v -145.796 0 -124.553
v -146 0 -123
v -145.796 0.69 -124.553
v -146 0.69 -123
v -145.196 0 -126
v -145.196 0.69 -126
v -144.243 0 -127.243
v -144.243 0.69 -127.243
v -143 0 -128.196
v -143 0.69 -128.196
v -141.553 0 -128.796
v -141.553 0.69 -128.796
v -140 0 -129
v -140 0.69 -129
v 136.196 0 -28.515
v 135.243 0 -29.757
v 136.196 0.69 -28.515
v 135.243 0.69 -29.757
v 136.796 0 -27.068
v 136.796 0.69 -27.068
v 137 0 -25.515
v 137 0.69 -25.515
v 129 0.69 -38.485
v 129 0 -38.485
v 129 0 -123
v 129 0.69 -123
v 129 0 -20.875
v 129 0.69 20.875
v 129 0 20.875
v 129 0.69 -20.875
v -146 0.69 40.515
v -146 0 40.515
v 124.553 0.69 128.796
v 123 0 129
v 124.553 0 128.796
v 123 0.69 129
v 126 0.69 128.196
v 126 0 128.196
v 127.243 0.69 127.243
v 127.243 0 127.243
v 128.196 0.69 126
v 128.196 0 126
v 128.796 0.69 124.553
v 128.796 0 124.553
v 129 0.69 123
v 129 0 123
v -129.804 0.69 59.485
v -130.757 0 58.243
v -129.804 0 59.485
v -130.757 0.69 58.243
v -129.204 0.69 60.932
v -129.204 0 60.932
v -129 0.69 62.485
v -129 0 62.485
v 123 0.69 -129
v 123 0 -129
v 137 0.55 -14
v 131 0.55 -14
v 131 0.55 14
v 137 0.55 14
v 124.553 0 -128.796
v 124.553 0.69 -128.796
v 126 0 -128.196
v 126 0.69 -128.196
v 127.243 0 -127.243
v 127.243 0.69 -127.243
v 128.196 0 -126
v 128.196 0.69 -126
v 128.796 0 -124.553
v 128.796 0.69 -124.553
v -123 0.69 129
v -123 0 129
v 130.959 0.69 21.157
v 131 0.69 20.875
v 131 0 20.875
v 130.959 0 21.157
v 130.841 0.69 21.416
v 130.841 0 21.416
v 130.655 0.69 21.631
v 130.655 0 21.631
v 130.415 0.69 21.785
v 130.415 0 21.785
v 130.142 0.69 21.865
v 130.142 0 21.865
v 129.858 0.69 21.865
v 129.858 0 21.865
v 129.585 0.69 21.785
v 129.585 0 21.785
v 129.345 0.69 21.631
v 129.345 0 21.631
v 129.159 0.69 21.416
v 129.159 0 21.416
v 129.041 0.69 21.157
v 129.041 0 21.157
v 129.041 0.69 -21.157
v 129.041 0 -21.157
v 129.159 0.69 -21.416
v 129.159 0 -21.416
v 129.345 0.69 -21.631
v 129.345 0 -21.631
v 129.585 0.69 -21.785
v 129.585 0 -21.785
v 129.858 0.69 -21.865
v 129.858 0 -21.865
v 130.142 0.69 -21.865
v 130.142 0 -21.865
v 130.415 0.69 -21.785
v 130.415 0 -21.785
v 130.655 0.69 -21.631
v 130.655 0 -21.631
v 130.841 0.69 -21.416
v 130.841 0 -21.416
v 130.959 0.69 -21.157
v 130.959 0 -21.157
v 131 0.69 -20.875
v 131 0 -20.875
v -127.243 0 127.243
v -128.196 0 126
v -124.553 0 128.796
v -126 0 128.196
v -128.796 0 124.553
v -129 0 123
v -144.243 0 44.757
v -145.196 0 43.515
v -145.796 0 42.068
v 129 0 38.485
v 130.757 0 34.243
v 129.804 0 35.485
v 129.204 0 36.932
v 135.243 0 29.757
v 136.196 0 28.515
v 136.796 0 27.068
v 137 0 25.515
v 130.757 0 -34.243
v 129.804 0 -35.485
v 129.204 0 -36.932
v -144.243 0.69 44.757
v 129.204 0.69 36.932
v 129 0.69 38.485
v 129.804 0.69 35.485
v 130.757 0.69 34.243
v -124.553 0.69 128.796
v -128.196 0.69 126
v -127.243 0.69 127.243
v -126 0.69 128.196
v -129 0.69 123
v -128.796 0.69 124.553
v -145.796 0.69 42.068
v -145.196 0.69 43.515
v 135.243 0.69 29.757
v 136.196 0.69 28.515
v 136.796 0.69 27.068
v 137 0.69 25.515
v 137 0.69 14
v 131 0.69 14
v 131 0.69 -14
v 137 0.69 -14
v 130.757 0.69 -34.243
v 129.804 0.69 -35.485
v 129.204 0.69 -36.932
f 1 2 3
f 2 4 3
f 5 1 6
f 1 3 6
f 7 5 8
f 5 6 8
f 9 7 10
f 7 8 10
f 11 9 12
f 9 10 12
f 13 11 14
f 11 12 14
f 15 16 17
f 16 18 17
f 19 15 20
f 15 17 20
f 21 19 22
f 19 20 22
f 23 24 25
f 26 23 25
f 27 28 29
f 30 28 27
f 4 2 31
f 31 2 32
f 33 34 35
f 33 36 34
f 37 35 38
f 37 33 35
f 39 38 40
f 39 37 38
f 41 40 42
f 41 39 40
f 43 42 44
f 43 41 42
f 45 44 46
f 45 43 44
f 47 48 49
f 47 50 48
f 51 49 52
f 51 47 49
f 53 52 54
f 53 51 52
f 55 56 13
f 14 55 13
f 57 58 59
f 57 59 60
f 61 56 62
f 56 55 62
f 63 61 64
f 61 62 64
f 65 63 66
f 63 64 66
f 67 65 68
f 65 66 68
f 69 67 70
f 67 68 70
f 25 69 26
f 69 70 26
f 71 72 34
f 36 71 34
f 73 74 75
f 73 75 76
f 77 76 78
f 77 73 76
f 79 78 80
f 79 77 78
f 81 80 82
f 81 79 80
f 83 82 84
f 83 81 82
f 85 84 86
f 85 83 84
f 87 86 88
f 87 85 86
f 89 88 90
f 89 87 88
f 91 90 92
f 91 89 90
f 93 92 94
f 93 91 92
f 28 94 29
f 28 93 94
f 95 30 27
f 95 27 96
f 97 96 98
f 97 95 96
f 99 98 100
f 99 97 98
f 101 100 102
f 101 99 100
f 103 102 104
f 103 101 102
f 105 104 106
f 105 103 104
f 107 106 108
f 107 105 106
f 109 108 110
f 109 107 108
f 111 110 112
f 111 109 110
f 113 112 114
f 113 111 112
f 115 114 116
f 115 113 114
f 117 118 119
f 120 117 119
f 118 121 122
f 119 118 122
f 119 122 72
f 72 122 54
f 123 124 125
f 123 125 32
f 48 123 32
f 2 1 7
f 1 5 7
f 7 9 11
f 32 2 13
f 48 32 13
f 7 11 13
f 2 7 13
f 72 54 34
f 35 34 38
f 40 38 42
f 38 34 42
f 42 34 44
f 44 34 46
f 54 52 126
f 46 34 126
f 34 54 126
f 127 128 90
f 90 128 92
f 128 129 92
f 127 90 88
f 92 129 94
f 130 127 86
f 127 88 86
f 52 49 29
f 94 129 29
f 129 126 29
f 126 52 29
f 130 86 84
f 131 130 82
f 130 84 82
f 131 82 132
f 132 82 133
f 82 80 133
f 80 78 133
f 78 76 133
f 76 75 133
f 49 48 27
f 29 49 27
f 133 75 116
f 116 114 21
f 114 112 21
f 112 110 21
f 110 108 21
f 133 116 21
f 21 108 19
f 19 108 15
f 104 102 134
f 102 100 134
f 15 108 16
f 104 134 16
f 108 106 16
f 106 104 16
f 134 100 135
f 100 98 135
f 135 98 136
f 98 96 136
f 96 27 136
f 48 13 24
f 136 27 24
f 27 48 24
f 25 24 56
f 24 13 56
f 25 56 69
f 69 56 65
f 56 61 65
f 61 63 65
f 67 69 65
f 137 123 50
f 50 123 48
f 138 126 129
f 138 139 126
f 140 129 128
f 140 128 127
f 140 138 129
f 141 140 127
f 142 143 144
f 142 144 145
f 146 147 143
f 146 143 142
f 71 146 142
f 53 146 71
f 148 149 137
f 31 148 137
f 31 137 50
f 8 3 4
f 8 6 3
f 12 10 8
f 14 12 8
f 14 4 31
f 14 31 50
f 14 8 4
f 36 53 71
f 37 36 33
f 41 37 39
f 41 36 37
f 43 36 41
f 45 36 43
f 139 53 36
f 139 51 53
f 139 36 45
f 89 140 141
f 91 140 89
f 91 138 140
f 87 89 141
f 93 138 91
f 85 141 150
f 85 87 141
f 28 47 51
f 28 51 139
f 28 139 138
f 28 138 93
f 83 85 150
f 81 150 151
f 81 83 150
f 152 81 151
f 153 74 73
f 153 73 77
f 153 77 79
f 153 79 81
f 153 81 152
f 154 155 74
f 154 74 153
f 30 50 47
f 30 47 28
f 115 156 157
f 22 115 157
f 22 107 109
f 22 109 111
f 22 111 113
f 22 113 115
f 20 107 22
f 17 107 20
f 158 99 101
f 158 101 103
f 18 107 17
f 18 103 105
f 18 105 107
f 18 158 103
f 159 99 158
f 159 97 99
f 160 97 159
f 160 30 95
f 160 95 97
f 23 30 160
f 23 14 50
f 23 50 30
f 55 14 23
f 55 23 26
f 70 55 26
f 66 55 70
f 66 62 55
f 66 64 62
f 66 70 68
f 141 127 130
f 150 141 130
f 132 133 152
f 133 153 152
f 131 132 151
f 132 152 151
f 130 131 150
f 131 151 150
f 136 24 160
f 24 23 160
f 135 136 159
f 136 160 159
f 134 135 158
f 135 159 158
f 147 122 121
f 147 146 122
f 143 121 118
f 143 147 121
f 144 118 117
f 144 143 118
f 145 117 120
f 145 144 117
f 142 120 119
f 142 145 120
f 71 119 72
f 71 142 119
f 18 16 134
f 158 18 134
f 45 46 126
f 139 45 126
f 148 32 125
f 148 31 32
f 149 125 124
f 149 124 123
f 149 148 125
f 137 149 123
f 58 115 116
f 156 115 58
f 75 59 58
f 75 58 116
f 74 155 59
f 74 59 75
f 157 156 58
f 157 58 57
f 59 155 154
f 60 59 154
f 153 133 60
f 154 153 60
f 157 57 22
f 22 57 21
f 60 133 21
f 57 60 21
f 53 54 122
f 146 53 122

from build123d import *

# Parameters (mm, degrees)
BOSS_EXTRUDE1_DEPTH = 0.69
CUT_EXTRUDE1_DEPTH  = 1.69
SKETCH3_W           = 6
SKETCH3_H           = 28
CUT_EXTRUDE2_DEPTH  = 0.14
FILLET1_R           = 6


with BuildPart() as part:
    # Sketch1 → Boss-Extrude1 (new body)
    with BuildSketch(Plane(origin=(0, 0, 0), x_dir=(1, 0, 0), z_dir=(0, 1, 0))):
        Polygon((-146, 129), (-146, -43), (-129, -60), (-129, -129), (129, -129), (129, -36), (137, -28), (137, 28), (129, 36), (129, 129), align=None)
    extrude(amount=BOSS_EXTRUDE1_DEPTH)

    # Sketch2 → Cut-Extrude1 (cut, through all)
    with BuildSketch(Plane(origin=(0, 0.69, 0), x_dir=(1, 0, 0), z_dir=(0, 1, 0))):
        with BuildLine():
            Line((131, 20.875), (131, -20.875))
            ThreePointArc((131, -20.875), (130, -21.875), (129, -20.875))
            Line((129, -20.875), (129, 20.875))
            ThreePointArc((129, 20.875), (130, 21.875), (131, 20.875))
        make_face()
    extrude(amount=-CUT_EXTRUDE1_DEPTH, mode=Mode.SUBTRACT)

    # Sketch3 → Cut-Extrude2 (cut)
    with BuildSketch(Plane(origin=(0, 0.69, 0), x_dir=(1, 0, 0), z_dir=(0, 1, 0))):
        with Locations((134, 0)):
            Rectangle(SKETCH3_W, SKETCH3_H)
    extrude(amount=-CUT_EXTRUDE2_DEPTH, mode=Mode.SUBTRACT)

    # Fillet1
    fillet1_edges = [part.edges().sort_by_distance(p)[0] for p in [
        (129, 0.345, 36),
        (129, 0.345, 129),
        (-129, 0.345, 129),
        (-129, 0.345, 60),
        (-146, 0.345, 43),
        (-146, 0.345, -129),
        (129, 0.345, -129),
        (129, 0.345, -36),
        (137, 0.345, -28),
        (137, 0.345, 28),
    ]]
    fillet(fillet1_edges, radius=FILLET1_R)


solid = part.part
